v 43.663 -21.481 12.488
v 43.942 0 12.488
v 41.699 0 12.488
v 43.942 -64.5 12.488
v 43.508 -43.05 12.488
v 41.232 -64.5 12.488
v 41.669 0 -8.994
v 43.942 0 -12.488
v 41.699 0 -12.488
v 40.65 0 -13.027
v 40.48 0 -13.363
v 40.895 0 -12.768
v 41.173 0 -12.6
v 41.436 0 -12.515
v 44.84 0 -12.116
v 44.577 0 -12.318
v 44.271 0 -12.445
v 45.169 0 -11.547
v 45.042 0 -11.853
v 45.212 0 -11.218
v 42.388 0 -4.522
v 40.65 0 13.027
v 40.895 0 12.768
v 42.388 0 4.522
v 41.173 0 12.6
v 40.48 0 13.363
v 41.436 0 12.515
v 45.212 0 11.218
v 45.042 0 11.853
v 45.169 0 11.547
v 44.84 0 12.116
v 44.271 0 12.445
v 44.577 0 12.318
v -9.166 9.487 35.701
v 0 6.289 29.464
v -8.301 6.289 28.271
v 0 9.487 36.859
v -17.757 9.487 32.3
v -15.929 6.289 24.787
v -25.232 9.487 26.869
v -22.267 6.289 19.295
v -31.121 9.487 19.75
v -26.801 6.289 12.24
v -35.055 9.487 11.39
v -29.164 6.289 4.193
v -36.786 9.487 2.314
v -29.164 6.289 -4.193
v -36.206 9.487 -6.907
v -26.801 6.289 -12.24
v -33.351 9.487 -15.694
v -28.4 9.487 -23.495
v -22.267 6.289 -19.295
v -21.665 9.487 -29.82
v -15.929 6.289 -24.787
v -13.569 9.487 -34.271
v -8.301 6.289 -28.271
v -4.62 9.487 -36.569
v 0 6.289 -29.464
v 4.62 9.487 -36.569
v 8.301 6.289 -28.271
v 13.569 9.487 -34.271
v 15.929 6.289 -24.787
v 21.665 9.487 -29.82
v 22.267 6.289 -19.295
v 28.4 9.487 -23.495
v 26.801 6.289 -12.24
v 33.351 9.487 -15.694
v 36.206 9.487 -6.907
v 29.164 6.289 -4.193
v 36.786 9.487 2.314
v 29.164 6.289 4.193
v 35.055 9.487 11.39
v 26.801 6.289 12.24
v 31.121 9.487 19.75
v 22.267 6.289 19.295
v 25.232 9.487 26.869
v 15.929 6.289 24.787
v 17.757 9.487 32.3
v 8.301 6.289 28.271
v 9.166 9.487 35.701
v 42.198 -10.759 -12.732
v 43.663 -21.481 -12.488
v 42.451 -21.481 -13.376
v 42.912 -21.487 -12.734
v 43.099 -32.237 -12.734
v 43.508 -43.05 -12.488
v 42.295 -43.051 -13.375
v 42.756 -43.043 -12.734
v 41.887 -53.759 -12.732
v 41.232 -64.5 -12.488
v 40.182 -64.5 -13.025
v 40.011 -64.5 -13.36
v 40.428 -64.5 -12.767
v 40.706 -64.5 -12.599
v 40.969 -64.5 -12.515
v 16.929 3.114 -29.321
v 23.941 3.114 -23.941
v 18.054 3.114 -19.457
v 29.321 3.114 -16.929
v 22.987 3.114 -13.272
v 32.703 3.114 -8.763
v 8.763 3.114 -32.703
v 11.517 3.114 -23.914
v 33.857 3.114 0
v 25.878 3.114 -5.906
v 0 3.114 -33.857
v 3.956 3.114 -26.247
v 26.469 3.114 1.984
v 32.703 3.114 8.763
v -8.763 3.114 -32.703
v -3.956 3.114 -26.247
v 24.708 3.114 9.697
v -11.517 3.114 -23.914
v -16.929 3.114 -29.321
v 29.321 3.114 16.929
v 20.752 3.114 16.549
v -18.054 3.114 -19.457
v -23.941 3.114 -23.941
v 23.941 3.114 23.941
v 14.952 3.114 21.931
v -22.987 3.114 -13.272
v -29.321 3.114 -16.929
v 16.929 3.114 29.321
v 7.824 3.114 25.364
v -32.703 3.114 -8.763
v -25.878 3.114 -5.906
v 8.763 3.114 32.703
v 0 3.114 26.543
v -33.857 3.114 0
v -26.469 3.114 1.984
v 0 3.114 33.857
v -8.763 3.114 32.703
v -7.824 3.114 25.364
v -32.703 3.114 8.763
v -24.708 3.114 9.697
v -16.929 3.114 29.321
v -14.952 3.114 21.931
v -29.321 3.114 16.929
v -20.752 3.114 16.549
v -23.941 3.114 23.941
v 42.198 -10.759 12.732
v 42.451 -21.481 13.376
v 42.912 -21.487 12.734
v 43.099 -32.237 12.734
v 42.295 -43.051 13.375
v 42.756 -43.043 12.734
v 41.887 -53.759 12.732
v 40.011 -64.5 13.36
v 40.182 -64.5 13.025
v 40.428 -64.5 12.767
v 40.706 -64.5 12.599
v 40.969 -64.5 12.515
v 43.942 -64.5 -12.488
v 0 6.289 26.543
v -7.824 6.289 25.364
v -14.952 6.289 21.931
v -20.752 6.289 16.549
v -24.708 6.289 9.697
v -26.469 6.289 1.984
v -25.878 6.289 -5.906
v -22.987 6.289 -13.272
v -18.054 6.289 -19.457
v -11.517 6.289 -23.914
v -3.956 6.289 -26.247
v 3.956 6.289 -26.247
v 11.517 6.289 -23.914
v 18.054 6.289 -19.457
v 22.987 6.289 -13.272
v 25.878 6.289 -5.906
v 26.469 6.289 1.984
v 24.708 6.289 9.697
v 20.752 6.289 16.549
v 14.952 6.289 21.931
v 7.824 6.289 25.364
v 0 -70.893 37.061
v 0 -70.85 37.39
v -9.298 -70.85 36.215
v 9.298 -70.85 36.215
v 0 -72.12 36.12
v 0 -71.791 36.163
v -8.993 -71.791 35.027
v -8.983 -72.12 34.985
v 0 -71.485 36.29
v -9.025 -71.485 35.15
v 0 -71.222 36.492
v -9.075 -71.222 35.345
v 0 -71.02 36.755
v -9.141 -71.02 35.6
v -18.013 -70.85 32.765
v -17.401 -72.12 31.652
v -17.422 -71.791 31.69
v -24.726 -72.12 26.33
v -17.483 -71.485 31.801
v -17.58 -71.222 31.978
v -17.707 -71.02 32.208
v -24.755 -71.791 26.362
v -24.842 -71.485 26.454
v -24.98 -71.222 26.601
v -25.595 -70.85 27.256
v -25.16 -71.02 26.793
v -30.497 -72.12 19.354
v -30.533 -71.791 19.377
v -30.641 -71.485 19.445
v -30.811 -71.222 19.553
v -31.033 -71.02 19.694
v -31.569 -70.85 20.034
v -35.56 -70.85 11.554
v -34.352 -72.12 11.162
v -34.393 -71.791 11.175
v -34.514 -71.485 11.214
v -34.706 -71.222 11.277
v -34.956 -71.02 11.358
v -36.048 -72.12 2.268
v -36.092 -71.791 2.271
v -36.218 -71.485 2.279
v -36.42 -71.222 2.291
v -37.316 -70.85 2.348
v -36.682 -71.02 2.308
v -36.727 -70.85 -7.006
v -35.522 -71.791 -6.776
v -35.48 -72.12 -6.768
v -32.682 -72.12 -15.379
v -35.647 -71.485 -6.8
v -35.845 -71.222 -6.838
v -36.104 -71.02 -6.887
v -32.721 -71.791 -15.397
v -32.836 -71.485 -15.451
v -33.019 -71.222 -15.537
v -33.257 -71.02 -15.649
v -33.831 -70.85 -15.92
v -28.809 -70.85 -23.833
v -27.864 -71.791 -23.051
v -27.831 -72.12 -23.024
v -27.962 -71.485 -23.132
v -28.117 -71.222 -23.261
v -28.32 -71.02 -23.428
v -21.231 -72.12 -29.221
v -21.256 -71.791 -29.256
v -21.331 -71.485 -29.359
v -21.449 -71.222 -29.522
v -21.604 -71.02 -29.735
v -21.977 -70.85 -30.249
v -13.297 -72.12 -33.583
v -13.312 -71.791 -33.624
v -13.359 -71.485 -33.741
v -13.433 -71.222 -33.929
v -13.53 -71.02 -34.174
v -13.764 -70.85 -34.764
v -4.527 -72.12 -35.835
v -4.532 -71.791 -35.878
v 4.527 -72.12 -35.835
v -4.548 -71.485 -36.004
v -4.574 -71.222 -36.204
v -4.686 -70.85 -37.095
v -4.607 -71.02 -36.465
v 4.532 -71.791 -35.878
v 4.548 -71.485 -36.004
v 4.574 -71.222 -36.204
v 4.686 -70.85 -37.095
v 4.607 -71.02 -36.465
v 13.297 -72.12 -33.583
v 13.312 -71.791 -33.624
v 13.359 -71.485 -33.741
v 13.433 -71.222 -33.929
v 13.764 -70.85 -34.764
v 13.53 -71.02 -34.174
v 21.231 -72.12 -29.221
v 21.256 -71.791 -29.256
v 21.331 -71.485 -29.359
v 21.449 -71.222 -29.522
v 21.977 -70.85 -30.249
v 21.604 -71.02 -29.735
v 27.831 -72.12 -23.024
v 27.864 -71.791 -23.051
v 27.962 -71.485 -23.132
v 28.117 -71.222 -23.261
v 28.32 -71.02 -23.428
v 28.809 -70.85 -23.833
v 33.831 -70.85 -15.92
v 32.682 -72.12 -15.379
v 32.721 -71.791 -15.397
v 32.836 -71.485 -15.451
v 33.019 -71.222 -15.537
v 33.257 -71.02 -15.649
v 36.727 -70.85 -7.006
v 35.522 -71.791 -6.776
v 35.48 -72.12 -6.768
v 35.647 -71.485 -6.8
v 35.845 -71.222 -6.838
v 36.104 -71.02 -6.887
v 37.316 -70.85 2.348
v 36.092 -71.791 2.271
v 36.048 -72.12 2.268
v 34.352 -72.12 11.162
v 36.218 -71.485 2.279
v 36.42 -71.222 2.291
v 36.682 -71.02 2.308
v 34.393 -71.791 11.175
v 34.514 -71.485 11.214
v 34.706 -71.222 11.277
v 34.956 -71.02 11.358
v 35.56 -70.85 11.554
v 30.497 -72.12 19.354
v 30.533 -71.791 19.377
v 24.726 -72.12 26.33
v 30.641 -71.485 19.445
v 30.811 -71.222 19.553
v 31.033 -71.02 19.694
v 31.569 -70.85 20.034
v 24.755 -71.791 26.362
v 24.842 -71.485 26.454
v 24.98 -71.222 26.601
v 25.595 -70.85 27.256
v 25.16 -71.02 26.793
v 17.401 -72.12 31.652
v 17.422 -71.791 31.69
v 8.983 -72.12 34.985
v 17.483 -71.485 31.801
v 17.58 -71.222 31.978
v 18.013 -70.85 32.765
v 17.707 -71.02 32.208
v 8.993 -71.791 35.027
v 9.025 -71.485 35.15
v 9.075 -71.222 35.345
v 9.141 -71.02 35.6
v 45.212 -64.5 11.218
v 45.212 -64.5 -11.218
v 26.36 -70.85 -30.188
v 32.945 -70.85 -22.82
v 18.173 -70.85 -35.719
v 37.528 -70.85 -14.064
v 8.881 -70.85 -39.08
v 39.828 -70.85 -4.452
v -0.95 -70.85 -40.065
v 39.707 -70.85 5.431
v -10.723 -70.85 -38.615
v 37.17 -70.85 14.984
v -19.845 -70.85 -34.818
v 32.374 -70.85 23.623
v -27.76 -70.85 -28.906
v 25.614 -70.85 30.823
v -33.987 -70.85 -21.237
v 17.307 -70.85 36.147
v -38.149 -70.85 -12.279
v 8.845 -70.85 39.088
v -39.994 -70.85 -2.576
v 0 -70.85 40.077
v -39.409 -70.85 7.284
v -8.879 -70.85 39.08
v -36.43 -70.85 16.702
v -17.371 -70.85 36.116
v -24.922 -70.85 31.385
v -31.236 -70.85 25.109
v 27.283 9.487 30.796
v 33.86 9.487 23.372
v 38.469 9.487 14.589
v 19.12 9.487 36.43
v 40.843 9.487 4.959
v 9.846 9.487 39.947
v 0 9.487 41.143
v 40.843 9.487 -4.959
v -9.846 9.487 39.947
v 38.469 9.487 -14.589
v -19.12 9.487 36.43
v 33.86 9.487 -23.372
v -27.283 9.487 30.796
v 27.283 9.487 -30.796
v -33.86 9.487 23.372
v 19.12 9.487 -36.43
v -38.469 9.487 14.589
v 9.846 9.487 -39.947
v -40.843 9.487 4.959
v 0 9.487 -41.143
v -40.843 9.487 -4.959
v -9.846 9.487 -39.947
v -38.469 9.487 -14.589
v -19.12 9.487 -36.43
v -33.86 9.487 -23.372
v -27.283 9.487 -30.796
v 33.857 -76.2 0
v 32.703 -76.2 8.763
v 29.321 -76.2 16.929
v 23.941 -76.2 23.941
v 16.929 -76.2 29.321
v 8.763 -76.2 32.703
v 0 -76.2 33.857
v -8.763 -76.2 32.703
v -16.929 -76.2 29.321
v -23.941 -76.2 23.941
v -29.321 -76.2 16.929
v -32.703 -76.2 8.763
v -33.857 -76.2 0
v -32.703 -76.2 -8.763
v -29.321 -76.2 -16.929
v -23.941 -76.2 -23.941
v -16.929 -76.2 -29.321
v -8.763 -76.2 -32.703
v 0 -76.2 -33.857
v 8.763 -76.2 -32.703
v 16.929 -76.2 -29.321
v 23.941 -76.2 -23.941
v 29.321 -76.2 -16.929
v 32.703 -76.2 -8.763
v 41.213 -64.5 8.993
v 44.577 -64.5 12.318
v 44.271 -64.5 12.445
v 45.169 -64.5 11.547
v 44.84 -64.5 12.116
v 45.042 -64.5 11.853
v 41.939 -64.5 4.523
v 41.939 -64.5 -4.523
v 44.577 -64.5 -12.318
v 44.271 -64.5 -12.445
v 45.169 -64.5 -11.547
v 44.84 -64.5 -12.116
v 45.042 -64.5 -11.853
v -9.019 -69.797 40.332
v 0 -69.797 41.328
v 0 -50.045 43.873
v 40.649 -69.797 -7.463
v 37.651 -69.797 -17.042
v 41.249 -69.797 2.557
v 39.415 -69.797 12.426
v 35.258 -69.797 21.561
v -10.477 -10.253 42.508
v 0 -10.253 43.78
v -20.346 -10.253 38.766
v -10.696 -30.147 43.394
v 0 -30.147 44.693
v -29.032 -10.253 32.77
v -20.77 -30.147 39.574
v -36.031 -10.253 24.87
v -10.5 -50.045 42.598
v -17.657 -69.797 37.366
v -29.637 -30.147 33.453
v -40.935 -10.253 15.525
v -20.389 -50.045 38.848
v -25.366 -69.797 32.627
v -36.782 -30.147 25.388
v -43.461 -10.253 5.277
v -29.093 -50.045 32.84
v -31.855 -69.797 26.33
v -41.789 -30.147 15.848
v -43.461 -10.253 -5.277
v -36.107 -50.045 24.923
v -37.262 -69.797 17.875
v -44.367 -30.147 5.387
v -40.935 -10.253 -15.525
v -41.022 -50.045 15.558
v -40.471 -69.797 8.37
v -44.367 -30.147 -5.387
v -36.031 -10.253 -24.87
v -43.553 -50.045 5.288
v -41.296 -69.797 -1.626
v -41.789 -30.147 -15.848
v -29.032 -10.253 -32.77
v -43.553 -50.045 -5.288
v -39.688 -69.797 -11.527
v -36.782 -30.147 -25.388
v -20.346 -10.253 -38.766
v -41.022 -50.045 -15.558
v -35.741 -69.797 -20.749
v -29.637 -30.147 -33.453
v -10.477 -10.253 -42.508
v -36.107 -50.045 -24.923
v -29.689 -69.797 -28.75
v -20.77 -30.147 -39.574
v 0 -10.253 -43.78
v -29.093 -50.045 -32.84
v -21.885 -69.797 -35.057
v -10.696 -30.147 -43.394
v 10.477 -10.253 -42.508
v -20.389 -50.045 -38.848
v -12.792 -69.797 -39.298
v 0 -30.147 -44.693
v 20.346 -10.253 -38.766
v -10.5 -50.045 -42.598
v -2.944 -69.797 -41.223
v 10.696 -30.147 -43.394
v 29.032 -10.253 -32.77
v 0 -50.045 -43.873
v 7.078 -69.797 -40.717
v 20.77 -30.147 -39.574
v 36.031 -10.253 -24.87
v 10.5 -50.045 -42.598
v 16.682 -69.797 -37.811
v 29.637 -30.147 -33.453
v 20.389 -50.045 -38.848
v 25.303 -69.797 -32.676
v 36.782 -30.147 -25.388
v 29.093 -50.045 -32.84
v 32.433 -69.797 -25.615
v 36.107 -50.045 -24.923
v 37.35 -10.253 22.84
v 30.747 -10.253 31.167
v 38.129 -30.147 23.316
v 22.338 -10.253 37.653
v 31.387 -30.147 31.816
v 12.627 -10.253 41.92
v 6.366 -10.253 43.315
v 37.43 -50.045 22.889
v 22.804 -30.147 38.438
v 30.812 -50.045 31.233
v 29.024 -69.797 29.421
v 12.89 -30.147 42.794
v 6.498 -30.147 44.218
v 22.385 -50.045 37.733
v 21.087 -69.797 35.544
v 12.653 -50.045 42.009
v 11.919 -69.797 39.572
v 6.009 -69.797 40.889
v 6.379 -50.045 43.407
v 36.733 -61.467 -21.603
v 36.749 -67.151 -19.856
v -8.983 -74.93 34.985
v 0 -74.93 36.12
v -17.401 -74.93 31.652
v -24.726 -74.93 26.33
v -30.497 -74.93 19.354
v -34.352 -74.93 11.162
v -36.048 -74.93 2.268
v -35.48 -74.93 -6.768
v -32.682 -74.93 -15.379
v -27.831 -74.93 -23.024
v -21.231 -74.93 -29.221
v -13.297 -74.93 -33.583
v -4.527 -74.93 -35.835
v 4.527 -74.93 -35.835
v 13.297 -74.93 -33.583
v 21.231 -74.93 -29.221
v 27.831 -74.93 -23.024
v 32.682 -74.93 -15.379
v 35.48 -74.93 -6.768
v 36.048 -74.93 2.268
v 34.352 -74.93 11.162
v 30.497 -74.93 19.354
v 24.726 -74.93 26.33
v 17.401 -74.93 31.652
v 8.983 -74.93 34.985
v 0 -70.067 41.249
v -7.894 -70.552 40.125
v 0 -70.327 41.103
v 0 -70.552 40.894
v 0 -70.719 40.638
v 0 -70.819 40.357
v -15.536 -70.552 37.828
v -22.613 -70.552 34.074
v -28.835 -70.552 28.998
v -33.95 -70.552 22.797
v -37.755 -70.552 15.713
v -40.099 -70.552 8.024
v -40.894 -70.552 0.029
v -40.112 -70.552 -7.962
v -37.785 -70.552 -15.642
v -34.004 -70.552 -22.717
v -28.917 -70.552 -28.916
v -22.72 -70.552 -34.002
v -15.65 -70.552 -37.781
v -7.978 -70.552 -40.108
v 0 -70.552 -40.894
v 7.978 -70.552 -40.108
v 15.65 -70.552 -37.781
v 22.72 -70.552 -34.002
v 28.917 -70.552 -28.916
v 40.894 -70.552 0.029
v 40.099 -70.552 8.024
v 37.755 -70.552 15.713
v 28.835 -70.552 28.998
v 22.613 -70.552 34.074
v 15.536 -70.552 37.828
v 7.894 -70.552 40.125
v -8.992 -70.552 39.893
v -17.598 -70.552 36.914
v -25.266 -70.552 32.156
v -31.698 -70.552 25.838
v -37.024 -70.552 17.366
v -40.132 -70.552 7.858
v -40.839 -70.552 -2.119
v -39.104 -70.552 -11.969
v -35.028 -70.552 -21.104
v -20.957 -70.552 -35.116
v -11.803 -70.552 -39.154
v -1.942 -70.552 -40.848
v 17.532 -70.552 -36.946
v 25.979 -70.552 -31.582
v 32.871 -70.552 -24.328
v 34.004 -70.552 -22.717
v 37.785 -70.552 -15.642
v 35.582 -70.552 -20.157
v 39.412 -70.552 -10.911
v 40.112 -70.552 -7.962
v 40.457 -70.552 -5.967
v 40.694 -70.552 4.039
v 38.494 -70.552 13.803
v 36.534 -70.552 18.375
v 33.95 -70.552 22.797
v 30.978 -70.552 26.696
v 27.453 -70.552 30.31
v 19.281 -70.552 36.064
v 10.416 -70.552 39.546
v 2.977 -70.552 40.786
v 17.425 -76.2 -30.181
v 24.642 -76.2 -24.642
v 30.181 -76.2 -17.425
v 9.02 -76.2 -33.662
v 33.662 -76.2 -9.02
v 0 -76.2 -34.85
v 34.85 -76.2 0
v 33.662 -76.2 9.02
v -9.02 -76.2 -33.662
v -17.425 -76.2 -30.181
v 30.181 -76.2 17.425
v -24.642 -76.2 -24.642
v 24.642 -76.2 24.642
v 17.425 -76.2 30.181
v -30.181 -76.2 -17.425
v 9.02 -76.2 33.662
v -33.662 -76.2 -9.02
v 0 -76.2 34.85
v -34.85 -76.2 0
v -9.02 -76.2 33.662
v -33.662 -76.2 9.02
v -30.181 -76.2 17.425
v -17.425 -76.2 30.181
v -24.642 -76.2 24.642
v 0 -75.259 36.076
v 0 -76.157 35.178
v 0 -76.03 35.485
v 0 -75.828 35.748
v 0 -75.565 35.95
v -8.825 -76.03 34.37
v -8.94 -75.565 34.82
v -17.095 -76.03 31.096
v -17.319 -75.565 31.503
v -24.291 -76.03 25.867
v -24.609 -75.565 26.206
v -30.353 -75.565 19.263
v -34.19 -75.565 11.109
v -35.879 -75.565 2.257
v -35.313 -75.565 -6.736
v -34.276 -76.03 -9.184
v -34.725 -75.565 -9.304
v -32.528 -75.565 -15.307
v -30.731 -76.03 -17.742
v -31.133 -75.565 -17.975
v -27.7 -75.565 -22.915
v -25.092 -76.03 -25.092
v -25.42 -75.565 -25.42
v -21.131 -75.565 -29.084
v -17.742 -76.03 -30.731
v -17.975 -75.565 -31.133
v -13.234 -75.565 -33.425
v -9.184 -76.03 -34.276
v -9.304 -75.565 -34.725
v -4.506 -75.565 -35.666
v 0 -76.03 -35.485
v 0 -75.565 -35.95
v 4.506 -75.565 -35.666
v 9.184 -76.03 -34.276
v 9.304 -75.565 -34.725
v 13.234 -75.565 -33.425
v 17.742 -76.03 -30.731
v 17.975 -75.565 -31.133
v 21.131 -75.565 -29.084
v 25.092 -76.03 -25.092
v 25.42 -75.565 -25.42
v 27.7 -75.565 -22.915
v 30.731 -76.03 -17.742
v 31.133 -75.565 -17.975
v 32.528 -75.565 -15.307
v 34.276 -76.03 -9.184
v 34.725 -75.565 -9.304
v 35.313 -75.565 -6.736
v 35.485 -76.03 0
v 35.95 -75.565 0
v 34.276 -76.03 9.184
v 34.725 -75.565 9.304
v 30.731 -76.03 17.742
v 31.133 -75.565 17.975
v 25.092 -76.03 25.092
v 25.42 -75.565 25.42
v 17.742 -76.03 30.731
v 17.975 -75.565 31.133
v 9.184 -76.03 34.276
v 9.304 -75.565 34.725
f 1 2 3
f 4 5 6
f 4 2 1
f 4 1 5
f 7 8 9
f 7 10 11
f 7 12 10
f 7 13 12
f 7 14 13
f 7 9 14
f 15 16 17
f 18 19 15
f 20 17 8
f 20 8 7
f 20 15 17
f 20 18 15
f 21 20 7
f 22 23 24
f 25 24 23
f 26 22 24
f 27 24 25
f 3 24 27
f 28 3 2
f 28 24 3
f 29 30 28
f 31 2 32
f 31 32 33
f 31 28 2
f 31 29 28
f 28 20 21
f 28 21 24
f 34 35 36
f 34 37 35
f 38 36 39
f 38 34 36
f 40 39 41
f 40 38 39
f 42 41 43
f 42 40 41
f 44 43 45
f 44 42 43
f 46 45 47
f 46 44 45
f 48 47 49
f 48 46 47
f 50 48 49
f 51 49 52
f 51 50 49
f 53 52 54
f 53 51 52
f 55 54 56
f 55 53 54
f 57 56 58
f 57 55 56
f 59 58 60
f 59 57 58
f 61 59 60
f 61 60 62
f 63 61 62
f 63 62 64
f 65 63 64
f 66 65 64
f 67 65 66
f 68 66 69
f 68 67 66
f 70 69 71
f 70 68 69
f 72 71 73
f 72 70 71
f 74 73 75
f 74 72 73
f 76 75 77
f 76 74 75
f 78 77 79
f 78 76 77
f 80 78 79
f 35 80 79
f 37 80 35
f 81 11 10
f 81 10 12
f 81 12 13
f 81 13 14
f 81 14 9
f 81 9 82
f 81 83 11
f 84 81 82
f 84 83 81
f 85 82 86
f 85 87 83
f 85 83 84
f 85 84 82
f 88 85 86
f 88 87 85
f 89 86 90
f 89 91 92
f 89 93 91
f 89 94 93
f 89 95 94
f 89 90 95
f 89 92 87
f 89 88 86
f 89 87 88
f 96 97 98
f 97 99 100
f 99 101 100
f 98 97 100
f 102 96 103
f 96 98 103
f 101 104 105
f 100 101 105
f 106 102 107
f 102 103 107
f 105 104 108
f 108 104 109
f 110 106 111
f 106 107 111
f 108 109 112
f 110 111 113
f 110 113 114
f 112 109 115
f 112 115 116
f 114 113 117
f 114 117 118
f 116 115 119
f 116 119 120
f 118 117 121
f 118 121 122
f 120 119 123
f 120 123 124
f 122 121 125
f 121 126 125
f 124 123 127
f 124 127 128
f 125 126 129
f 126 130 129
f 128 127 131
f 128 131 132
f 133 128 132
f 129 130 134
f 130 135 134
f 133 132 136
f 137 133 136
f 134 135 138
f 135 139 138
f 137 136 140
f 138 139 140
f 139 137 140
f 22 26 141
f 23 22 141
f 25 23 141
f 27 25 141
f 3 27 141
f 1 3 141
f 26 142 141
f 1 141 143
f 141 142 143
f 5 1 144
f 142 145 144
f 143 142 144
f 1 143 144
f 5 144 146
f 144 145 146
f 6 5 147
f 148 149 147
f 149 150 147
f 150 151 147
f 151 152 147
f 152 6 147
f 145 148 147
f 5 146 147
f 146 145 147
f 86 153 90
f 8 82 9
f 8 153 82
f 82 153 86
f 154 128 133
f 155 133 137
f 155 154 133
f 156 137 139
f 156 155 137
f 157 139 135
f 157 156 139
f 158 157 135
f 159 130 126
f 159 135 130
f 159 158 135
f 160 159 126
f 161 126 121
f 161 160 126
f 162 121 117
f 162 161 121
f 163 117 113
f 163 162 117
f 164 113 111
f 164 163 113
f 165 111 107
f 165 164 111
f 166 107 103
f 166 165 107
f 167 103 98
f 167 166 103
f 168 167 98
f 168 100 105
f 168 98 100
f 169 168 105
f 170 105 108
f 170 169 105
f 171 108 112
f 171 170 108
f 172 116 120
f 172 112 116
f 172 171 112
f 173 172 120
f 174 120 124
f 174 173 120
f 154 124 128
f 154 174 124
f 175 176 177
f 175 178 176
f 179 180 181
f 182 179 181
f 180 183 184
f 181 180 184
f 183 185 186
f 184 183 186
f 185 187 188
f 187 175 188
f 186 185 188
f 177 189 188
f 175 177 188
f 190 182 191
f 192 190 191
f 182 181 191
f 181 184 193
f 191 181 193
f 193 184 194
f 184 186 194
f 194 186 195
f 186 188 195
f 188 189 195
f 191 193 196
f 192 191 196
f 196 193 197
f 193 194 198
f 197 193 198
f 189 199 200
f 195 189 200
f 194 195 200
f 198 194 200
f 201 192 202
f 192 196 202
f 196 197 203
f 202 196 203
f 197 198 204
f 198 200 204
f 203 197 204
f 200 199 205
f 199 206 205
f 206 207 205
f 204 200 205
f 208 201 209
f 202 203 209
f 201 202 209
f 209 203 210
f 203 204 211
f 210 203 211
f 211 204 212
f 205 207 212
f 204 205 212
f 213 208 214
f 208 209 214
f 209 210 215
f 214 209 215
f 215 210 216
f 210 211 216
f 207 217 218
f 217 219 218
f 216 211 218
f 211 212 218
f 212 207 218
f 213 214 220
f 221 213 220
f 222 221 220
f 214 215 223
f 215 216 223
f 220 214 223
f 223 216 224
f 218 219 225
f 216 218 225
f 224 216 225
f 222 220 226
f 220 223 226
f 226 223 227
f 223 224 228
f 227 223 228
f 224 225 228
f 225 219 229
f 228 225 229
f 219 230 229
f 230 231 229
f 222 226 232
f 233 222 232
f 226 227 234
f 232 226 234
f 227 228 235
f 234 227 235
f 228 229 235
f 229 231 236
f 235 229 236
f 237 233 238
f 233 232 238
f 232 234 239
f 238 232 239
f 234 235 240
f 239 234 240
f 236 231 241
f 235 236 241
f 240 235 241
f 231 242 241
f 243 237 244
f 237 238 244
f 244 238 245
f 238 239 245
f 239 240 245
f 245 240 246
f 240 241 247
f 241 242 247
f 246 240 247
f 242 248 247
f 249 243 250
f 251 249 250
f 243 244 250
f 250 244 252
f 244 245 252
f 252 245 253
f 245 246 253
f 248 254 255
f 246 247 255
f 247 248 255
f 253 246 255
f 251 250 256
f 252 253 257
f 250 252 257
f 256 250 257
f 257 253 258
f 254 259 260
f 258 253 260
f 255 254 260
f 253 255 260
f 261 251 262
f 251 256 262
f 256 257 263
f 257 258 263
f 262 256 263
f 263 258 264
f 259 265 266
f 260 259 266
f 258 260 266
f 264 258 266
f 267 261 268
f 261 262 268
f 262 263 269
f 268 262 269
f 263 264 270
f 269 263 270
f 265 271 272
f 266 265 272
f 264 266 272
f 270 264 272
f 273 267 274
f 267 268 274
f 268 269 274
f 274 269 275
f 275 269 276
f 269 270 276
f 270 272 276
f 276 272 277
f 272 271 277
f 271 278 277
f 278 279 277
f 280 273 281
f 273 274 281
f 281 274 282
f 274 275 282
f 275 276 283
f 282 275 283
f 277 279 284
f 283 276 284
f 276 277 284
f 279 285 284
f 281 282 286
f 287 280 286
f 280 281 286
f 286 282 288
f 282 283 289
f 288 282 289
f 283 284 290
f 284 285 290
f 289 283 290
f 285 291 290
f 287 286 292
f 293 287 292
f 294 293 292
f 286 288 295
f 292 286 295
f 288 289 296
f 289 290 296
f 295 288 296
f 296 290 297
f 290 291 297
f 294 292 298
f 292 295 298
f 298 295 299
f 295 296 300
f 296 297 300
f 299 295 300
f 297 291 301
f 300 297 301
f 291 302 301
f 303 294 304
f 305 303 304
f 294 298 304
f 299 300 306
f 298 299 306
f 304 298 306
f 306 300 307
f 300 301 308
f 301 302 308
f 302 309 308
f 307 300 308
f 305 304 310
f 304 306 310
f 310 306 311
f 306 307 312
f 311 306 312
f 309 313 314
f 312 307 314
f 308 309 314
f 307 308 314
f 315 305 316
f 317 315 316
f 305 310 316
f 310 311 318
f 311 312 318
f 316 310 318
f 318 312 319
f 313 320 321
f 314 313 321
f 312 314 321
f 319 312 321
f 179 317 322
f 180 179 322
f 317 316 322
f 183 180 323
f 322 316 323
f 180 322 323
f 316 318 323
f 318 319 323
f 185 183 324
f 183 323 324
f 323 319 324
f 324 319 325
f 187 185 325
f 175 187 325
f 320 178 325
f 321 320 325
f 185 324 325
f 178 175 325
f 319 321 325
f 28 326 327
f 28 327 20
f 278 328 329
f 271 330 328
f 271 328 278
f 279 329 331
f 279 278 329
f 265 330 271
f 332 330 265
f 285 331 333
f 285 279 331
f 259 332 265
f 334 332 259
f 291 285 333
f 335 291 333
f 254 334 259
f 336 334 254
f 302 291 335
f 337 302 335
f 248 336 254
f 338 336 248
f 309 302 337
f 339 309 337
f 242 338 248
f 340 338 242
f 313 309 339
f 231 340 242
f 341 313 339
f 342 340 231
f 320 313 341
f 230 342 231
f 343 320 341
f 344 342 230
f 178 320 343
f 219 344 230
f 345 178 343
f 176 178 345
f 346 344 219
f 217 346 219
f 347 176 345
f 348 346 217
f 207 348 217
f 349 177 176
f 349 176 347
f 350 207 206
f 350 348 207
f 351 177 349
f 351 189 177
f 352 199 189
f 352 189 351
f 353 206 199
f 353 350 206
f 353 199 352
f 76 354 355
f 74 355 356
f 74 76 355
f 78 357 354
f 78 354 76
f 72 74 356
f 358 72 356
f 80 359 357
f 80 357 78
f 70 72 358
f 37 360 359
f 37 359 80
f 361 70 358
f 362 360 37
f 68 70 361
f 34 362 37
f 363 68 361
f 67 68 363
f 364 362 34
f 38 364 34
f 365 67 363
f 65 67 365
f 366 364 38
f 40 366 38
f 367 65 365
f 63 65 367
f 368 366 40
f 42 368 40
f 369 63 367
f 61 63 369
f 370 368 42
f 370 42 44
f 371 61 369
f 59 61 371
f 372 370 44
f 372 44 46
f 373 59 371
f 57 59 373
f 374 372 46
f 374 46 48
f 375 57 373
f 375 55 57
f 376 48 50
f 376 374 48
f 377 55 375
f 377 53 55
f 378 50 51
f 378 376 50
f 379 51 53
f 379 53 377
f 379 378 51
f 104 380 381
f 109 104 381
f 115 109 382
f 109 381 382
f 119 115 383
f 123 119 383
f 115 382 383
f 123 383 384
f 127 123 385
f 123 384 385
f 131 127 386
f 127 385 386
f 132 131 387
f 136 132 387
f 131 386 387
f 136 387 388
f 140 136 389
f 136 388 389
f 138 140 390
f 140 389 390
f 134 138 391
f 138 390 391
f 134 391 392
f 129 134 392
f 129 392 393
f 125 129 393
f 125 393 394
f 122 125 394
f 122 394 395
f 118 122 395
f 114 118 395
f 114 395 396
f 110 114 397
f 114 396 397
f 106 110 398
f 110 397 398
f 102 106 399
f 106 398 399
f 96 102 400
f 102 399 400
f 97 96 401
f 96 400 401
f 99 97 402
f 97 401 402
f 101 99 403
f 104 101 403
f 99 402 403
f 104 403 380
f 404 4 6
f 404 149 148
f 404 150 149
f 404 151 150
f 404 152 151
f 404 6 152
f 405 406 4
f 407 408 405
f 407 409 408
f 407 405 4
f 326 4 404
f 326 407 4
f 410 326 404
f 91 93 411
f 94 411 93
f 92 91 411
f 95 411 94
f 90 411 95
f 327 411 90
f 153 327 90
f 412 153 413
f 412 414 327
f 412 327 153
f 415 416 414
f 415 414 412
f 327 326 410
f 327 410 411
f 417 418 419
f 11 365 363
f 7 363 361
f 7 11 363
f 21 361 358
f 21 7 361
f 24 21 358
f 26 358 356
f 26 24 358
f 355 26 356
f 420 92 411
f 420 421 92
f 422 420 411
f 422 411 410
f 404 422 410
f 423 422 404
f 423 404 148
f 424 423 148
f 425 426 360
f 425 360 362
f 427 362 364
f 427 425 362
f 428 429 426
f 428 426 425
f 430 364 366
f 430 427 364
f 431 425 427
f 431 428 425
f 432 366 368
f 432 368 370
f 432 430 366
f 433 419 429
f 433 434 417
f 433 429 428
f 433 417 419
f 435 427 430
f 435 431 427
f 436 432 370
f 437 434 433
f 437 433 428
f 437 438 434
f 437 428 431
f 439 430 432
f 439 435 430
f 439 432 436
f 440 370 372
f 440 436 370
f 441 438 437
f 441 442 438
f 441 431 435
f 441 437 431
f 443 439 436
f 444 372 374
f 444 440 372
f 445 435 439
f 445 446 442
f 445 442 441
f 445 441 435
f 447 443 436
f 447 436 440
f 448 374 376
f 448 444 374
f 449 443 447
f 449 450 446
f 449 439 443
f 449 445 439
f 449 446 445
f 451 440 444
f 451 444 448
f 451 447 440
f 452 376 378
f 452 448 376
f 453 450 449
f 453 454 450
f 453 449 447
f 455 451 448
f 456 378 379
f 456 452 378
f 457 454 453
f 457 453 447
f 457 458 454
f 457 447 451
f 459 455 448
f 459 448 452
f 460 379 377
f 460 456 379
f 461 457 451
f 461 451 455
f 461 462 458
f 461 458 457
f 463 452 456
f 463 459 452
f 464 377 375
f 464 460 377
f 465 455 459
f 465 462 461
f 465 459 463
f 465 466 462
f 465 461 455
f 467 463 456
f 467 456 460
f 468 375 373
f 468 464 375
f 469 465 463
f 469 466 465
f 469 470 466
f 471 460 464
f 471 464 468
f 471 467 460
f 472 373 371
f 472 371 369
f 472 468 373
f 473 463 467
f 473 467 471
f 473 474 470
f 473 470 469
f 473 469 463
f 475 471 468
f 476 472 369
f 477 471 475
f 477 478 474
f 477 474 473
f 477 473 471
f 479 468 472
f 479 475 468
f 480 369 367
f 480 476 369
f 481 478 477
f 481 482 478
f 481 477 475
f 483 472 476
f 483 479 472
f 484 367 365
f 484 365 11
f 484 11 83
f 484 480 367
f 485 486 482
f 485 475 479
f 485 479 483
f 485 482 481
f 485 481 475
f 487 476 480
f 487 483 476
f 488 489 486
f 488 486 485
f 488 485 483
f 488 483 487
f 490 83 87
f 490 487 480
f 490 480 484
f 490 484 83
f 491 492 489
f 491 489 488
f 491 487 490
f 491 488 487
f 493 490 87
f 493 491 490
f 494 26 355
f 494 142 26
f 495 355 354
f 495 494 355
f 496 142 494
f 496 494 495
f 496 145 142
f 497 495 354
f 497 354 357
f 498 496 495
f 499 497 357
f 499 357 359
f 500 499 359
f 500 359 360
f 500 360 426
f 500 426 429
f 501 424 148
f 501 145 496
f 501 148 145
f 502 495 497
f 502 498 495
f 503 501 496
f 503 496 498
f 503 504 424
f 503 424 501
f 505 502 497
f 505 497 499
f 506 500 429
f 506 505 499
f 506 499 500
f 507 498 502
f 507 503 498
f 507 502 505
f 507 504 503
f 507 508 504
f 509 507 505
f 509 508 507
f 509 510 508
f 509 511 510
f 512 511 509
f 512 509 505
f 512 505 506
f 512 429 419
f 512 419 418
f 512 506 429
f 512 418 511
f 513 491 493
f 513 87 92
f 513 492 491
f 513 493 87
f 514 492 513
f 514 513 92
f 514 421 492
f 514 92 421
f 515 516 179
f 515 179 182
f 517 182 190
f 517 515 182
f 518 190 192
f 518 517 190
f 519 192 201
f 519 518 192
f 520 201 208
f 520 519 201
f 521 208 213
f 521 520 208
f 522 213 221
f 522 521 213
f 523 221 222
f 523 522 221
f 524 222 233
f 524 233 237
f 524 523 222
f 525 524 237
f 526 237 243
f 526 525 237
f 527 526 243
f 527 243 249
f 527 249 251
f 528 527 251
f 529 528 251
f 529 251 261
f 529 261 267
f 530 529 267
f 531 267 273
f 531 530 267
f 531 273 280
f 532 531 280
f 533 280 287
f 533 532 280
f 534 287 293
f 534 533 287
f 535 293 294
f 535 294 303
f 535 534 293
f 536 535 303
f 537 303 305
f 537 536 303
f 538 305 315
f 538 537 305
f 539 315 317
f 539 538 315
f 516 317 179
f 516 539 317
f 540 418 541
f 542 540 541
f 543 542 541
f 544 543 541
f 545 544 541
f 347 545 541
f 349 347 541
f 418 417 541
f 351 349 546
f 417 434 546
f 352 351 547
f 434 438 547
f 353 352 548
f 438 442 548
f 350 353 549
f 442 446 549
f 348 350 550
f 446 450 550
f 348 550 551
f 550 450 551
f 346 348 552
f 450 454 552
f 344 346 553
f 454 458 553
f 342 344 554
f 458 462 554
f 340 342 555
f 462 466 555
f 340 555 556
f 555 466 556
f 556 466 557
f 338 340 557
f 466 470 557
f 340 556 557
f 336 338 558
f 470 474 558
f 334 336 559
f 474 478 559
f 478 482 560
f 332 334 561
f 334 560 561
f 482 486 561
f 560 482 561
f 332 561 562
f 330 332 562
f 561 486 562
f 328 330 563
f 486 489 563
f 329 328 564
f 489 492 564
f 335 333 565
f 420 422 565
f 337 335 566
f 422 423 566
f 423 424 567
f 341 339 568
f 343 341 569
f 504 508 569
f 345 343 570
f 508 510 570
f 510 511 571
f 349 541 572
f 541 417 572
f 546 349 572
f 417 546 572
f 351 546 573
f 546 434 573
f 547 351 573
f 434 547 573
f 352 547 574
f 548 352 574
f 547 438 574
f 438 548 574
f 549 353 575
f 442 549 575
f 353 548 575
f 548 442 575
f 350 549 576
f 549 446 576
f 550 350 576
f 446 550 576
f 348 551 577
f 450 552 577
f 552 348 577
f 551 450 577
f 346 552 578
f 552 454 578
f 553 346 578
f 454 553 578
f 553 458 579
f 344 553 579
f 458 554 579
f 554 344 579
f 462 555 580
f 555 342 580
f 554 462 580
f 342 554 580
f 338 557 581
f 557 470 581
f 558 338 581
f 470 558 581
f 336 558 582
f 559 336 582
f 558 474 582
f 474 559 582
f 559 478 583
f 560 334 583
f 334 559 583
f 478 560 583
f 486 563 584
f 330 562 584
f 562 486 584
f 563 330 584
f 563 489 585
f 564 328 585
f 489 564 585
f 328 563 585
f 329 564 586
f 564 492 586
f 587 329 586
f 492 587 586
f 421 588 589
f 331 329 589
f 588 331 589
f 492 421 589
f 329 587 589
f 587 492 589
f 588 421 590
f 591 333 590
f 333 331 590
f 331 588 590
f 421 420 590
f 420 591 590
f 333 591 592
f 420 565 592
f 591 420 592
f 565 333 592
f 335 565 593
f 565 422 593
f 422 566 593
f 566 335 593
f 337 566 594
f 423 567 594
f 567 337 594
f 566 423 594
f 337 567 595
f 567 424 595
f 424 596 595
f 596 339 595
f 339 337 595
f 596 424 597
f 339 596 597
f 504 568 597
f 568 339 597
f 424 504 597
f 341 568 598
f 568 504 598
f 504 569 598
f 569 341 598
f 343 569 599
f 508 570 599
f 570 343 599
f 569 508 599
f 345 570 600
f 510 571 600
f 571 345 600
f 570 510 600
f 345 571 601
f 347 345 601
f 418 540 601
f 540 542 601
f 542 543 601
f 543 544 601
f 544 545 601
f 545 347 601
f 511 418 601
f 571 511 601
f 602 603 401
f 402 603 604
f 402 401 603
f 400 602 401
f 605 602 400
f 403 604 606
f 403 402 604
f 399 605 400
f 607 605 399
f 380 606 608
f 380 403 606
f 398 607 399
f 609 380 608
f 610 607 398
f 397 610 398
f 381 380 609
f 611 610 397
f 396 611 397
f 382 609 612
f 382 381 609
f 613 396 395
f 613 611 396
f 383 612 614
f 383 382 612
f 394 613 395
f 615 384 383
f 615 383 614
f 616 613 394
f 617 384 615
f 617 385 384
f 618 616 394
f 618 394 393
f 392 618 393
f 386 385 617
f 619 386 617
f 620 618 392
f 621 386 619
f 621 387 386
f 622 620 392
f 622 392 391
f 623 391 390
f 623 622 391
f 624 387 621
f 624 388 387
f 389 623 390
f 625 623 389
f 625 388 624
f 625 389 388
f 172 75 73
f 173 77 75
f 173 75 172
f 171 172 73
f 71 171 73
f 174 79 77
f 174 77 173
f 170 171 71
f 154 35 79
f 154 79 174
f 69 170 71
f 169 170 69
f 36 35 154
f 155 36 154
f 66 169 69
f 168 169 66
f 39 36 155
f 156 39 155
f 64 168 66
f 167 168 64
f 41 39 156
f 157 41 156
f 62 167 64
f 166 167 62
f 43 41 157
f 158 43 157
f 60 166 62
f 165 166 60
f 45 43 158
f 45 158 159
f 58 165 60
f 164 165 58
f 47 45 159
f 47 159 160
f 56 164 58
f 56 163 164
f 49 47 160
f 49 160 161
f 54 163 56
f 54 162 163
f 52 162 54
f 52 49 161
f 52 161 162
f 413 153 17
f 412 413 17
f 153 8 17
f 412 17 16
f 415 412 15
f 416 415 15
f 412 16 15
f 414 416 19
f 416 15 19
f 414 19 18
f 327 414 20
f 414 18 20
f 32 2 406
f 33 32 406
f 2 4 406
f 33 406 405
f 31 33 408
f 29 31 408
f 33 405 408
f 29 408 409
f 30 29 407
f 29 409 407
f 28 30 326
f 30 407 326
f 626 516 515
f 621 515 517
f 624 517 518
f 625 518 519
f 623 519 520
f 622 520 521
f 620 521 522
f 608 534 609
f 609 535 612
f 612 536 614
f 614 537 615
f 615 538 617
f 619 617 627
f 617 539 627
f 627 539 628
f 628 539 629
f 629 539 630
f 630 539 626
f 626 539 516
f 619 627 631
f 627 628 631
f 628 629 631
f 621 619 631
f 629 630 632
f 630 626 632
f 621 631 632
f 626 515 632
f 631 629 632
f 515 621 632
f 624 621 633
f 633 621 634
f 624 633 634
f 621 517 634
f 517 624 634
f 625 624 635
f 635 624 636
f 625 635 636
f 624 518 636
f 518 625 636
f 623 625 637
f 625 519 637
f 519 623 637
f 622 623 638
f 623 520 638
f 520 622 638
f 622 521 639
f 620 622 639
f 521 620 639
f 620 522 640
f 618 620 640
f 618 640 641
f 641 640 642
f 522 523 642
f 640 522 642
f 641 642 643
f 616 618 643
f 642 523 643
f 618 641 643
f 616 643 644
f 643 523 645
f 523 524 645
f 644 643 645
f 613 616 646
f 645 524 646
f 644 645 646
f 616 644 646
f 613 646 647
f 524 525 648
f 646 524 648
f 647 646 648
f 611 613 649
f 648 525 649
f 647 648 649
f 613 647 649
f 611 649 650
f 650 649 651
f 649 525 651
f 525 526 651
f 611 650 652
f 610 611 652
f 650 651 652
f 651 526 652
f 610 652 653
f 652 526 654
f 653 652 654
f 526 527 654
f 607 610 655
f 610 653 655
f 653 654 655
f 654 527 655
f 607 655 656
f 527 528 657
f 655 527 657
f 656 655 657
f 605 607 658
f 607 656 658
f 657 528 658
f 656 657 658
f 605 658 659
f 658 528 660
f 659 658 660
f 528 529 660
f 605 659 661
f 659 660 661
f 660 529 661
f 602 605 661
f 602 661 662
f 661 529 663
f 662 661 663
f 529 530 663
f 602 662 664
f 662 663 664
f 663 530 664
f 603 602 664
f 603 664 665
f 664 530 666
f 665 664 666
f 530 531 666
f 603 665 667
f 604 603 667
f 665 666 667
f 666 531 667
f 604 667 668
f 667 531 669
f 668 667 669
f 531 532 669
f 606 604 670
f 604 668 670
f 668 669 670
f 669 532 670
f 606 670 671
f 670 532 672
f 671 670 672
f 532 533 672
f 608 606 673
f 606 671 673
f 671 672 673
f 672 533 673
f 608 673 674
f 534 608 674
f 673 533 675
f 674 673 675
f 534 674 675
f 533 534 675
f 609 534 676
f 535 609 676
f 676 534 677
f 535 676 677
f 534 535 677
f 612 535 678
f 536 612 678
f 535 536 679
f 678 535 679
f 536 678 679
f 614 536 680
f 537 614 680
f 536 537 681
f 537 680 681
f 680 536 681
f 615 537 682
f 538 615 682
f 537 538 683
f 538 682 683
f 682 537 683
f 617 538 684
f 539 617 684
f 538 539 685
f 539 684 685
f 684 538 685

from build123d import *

# Parameters (mm, degrees)
F3_R      = 26.543
F4_DEPTH  = 114.554
F6_R      = 28.5434977465
F7_DEPTH  = 79.315283745
F9_R      = 33.8571196856
F9_R_2    = 28.5434977465
F10_DEPTH = 79.314283745
F14_R     = 1.27


with BuildPart() as f2:
    # F0 (on Right) → F2 (revolve)
    with BuildSketch(Plane.YZ):
        with BuildLine():
            Line((-76.2, 0), (0, 0))
            Line((0, 0), (0, 26.543))
            Line((0, 26.543), (6.289283745, 26.543))
            Line((6.289283745, 26.543), (6.289283745, 29.464))
            Line((6.289283745, 29.464), (9.4871073961, 36.8591547012))
            Line((9.4871073961, 36.8591547012), (9.4871073961, 41.1427468061))
            ThreePointArc((9.4871073961, 41.1427468061), (-30.6813567877, 44.6934809621), (-70.8498209715, 41.1427468061))
            Line((-70.8498209715, 41.1427468061), (-70.8498209715, 36.1197404563))
            Line((-70.8498209715, 36.1197404563), (-76.2, 36.1197404563))
            Line((-76.2, 36.1197404563), (-76.2, 0))
        make_face()
    revolve(axis=Axis((0, -94.0737053752, 0), (0, -1, 0)))

    # F3 (on face) → F4 (cut)
    with BuildSketch(Plane(origin=(0, 0, 0), x_dir=(-1, 0, 0), z_dir=(0, 1, 0))):
        Circle(F3_R)
    extrude(amount=-F4_DEPTH, mode=Mode.SUBTRACT)

    # F6 (on offset) → F7 (cut, through all)
    with BuildSketch(Plane(origin=(0, 3.114283745, 0), x_dir=(-1, 0, 0), z_dir=(0, 1, 0))):
        Circle(F6_R)
    extrude(amount=-F7_DEPTH, mode=Mode.SUBTRACT)

    # F9 (on face) → F10 (cut, through all)
    with BuildSketch(Plane.XZ.offset(76.2)):
        Circle(F9_R)
        Circle(F9_R_2, mode=Mode.SUBTRACT)
    extrude(amount=-F10_DEPTH, mode=Mode.SUBTRACT)

    # F12 (on offset) → F13 (join, up to the next surface of F2)
    with BuildSketch(Plane.YZ.offset(45.212)):
        Polygon((0, -12.4878594652), (0, 0), (0, 12.4878594652), (-64.4998209715, 12.4878594652), (-64.4998209715, -12.4878594652), align=None)
    extrude(until=Until.NEXT, dir=(-1, 0, 0))

    # F14
    f14_edges = [f2.edges().sort_by_distance(p)[0] for p in [
        (0, -76.2, -36.11974),
        (0, -70.849821, -36.11974),
        (0, -70.849821, -41.142747),
        (42.907689, -32.267195, 12.487859),
        (45.212, -32.24991, 12.487859),
        (45.212, -32.24991, -12.487859),
        (42.907689, -32.267195, -12.487859),
    ]]
    fillet(f14_edges, radius=F14_R)


solid = f2.part
